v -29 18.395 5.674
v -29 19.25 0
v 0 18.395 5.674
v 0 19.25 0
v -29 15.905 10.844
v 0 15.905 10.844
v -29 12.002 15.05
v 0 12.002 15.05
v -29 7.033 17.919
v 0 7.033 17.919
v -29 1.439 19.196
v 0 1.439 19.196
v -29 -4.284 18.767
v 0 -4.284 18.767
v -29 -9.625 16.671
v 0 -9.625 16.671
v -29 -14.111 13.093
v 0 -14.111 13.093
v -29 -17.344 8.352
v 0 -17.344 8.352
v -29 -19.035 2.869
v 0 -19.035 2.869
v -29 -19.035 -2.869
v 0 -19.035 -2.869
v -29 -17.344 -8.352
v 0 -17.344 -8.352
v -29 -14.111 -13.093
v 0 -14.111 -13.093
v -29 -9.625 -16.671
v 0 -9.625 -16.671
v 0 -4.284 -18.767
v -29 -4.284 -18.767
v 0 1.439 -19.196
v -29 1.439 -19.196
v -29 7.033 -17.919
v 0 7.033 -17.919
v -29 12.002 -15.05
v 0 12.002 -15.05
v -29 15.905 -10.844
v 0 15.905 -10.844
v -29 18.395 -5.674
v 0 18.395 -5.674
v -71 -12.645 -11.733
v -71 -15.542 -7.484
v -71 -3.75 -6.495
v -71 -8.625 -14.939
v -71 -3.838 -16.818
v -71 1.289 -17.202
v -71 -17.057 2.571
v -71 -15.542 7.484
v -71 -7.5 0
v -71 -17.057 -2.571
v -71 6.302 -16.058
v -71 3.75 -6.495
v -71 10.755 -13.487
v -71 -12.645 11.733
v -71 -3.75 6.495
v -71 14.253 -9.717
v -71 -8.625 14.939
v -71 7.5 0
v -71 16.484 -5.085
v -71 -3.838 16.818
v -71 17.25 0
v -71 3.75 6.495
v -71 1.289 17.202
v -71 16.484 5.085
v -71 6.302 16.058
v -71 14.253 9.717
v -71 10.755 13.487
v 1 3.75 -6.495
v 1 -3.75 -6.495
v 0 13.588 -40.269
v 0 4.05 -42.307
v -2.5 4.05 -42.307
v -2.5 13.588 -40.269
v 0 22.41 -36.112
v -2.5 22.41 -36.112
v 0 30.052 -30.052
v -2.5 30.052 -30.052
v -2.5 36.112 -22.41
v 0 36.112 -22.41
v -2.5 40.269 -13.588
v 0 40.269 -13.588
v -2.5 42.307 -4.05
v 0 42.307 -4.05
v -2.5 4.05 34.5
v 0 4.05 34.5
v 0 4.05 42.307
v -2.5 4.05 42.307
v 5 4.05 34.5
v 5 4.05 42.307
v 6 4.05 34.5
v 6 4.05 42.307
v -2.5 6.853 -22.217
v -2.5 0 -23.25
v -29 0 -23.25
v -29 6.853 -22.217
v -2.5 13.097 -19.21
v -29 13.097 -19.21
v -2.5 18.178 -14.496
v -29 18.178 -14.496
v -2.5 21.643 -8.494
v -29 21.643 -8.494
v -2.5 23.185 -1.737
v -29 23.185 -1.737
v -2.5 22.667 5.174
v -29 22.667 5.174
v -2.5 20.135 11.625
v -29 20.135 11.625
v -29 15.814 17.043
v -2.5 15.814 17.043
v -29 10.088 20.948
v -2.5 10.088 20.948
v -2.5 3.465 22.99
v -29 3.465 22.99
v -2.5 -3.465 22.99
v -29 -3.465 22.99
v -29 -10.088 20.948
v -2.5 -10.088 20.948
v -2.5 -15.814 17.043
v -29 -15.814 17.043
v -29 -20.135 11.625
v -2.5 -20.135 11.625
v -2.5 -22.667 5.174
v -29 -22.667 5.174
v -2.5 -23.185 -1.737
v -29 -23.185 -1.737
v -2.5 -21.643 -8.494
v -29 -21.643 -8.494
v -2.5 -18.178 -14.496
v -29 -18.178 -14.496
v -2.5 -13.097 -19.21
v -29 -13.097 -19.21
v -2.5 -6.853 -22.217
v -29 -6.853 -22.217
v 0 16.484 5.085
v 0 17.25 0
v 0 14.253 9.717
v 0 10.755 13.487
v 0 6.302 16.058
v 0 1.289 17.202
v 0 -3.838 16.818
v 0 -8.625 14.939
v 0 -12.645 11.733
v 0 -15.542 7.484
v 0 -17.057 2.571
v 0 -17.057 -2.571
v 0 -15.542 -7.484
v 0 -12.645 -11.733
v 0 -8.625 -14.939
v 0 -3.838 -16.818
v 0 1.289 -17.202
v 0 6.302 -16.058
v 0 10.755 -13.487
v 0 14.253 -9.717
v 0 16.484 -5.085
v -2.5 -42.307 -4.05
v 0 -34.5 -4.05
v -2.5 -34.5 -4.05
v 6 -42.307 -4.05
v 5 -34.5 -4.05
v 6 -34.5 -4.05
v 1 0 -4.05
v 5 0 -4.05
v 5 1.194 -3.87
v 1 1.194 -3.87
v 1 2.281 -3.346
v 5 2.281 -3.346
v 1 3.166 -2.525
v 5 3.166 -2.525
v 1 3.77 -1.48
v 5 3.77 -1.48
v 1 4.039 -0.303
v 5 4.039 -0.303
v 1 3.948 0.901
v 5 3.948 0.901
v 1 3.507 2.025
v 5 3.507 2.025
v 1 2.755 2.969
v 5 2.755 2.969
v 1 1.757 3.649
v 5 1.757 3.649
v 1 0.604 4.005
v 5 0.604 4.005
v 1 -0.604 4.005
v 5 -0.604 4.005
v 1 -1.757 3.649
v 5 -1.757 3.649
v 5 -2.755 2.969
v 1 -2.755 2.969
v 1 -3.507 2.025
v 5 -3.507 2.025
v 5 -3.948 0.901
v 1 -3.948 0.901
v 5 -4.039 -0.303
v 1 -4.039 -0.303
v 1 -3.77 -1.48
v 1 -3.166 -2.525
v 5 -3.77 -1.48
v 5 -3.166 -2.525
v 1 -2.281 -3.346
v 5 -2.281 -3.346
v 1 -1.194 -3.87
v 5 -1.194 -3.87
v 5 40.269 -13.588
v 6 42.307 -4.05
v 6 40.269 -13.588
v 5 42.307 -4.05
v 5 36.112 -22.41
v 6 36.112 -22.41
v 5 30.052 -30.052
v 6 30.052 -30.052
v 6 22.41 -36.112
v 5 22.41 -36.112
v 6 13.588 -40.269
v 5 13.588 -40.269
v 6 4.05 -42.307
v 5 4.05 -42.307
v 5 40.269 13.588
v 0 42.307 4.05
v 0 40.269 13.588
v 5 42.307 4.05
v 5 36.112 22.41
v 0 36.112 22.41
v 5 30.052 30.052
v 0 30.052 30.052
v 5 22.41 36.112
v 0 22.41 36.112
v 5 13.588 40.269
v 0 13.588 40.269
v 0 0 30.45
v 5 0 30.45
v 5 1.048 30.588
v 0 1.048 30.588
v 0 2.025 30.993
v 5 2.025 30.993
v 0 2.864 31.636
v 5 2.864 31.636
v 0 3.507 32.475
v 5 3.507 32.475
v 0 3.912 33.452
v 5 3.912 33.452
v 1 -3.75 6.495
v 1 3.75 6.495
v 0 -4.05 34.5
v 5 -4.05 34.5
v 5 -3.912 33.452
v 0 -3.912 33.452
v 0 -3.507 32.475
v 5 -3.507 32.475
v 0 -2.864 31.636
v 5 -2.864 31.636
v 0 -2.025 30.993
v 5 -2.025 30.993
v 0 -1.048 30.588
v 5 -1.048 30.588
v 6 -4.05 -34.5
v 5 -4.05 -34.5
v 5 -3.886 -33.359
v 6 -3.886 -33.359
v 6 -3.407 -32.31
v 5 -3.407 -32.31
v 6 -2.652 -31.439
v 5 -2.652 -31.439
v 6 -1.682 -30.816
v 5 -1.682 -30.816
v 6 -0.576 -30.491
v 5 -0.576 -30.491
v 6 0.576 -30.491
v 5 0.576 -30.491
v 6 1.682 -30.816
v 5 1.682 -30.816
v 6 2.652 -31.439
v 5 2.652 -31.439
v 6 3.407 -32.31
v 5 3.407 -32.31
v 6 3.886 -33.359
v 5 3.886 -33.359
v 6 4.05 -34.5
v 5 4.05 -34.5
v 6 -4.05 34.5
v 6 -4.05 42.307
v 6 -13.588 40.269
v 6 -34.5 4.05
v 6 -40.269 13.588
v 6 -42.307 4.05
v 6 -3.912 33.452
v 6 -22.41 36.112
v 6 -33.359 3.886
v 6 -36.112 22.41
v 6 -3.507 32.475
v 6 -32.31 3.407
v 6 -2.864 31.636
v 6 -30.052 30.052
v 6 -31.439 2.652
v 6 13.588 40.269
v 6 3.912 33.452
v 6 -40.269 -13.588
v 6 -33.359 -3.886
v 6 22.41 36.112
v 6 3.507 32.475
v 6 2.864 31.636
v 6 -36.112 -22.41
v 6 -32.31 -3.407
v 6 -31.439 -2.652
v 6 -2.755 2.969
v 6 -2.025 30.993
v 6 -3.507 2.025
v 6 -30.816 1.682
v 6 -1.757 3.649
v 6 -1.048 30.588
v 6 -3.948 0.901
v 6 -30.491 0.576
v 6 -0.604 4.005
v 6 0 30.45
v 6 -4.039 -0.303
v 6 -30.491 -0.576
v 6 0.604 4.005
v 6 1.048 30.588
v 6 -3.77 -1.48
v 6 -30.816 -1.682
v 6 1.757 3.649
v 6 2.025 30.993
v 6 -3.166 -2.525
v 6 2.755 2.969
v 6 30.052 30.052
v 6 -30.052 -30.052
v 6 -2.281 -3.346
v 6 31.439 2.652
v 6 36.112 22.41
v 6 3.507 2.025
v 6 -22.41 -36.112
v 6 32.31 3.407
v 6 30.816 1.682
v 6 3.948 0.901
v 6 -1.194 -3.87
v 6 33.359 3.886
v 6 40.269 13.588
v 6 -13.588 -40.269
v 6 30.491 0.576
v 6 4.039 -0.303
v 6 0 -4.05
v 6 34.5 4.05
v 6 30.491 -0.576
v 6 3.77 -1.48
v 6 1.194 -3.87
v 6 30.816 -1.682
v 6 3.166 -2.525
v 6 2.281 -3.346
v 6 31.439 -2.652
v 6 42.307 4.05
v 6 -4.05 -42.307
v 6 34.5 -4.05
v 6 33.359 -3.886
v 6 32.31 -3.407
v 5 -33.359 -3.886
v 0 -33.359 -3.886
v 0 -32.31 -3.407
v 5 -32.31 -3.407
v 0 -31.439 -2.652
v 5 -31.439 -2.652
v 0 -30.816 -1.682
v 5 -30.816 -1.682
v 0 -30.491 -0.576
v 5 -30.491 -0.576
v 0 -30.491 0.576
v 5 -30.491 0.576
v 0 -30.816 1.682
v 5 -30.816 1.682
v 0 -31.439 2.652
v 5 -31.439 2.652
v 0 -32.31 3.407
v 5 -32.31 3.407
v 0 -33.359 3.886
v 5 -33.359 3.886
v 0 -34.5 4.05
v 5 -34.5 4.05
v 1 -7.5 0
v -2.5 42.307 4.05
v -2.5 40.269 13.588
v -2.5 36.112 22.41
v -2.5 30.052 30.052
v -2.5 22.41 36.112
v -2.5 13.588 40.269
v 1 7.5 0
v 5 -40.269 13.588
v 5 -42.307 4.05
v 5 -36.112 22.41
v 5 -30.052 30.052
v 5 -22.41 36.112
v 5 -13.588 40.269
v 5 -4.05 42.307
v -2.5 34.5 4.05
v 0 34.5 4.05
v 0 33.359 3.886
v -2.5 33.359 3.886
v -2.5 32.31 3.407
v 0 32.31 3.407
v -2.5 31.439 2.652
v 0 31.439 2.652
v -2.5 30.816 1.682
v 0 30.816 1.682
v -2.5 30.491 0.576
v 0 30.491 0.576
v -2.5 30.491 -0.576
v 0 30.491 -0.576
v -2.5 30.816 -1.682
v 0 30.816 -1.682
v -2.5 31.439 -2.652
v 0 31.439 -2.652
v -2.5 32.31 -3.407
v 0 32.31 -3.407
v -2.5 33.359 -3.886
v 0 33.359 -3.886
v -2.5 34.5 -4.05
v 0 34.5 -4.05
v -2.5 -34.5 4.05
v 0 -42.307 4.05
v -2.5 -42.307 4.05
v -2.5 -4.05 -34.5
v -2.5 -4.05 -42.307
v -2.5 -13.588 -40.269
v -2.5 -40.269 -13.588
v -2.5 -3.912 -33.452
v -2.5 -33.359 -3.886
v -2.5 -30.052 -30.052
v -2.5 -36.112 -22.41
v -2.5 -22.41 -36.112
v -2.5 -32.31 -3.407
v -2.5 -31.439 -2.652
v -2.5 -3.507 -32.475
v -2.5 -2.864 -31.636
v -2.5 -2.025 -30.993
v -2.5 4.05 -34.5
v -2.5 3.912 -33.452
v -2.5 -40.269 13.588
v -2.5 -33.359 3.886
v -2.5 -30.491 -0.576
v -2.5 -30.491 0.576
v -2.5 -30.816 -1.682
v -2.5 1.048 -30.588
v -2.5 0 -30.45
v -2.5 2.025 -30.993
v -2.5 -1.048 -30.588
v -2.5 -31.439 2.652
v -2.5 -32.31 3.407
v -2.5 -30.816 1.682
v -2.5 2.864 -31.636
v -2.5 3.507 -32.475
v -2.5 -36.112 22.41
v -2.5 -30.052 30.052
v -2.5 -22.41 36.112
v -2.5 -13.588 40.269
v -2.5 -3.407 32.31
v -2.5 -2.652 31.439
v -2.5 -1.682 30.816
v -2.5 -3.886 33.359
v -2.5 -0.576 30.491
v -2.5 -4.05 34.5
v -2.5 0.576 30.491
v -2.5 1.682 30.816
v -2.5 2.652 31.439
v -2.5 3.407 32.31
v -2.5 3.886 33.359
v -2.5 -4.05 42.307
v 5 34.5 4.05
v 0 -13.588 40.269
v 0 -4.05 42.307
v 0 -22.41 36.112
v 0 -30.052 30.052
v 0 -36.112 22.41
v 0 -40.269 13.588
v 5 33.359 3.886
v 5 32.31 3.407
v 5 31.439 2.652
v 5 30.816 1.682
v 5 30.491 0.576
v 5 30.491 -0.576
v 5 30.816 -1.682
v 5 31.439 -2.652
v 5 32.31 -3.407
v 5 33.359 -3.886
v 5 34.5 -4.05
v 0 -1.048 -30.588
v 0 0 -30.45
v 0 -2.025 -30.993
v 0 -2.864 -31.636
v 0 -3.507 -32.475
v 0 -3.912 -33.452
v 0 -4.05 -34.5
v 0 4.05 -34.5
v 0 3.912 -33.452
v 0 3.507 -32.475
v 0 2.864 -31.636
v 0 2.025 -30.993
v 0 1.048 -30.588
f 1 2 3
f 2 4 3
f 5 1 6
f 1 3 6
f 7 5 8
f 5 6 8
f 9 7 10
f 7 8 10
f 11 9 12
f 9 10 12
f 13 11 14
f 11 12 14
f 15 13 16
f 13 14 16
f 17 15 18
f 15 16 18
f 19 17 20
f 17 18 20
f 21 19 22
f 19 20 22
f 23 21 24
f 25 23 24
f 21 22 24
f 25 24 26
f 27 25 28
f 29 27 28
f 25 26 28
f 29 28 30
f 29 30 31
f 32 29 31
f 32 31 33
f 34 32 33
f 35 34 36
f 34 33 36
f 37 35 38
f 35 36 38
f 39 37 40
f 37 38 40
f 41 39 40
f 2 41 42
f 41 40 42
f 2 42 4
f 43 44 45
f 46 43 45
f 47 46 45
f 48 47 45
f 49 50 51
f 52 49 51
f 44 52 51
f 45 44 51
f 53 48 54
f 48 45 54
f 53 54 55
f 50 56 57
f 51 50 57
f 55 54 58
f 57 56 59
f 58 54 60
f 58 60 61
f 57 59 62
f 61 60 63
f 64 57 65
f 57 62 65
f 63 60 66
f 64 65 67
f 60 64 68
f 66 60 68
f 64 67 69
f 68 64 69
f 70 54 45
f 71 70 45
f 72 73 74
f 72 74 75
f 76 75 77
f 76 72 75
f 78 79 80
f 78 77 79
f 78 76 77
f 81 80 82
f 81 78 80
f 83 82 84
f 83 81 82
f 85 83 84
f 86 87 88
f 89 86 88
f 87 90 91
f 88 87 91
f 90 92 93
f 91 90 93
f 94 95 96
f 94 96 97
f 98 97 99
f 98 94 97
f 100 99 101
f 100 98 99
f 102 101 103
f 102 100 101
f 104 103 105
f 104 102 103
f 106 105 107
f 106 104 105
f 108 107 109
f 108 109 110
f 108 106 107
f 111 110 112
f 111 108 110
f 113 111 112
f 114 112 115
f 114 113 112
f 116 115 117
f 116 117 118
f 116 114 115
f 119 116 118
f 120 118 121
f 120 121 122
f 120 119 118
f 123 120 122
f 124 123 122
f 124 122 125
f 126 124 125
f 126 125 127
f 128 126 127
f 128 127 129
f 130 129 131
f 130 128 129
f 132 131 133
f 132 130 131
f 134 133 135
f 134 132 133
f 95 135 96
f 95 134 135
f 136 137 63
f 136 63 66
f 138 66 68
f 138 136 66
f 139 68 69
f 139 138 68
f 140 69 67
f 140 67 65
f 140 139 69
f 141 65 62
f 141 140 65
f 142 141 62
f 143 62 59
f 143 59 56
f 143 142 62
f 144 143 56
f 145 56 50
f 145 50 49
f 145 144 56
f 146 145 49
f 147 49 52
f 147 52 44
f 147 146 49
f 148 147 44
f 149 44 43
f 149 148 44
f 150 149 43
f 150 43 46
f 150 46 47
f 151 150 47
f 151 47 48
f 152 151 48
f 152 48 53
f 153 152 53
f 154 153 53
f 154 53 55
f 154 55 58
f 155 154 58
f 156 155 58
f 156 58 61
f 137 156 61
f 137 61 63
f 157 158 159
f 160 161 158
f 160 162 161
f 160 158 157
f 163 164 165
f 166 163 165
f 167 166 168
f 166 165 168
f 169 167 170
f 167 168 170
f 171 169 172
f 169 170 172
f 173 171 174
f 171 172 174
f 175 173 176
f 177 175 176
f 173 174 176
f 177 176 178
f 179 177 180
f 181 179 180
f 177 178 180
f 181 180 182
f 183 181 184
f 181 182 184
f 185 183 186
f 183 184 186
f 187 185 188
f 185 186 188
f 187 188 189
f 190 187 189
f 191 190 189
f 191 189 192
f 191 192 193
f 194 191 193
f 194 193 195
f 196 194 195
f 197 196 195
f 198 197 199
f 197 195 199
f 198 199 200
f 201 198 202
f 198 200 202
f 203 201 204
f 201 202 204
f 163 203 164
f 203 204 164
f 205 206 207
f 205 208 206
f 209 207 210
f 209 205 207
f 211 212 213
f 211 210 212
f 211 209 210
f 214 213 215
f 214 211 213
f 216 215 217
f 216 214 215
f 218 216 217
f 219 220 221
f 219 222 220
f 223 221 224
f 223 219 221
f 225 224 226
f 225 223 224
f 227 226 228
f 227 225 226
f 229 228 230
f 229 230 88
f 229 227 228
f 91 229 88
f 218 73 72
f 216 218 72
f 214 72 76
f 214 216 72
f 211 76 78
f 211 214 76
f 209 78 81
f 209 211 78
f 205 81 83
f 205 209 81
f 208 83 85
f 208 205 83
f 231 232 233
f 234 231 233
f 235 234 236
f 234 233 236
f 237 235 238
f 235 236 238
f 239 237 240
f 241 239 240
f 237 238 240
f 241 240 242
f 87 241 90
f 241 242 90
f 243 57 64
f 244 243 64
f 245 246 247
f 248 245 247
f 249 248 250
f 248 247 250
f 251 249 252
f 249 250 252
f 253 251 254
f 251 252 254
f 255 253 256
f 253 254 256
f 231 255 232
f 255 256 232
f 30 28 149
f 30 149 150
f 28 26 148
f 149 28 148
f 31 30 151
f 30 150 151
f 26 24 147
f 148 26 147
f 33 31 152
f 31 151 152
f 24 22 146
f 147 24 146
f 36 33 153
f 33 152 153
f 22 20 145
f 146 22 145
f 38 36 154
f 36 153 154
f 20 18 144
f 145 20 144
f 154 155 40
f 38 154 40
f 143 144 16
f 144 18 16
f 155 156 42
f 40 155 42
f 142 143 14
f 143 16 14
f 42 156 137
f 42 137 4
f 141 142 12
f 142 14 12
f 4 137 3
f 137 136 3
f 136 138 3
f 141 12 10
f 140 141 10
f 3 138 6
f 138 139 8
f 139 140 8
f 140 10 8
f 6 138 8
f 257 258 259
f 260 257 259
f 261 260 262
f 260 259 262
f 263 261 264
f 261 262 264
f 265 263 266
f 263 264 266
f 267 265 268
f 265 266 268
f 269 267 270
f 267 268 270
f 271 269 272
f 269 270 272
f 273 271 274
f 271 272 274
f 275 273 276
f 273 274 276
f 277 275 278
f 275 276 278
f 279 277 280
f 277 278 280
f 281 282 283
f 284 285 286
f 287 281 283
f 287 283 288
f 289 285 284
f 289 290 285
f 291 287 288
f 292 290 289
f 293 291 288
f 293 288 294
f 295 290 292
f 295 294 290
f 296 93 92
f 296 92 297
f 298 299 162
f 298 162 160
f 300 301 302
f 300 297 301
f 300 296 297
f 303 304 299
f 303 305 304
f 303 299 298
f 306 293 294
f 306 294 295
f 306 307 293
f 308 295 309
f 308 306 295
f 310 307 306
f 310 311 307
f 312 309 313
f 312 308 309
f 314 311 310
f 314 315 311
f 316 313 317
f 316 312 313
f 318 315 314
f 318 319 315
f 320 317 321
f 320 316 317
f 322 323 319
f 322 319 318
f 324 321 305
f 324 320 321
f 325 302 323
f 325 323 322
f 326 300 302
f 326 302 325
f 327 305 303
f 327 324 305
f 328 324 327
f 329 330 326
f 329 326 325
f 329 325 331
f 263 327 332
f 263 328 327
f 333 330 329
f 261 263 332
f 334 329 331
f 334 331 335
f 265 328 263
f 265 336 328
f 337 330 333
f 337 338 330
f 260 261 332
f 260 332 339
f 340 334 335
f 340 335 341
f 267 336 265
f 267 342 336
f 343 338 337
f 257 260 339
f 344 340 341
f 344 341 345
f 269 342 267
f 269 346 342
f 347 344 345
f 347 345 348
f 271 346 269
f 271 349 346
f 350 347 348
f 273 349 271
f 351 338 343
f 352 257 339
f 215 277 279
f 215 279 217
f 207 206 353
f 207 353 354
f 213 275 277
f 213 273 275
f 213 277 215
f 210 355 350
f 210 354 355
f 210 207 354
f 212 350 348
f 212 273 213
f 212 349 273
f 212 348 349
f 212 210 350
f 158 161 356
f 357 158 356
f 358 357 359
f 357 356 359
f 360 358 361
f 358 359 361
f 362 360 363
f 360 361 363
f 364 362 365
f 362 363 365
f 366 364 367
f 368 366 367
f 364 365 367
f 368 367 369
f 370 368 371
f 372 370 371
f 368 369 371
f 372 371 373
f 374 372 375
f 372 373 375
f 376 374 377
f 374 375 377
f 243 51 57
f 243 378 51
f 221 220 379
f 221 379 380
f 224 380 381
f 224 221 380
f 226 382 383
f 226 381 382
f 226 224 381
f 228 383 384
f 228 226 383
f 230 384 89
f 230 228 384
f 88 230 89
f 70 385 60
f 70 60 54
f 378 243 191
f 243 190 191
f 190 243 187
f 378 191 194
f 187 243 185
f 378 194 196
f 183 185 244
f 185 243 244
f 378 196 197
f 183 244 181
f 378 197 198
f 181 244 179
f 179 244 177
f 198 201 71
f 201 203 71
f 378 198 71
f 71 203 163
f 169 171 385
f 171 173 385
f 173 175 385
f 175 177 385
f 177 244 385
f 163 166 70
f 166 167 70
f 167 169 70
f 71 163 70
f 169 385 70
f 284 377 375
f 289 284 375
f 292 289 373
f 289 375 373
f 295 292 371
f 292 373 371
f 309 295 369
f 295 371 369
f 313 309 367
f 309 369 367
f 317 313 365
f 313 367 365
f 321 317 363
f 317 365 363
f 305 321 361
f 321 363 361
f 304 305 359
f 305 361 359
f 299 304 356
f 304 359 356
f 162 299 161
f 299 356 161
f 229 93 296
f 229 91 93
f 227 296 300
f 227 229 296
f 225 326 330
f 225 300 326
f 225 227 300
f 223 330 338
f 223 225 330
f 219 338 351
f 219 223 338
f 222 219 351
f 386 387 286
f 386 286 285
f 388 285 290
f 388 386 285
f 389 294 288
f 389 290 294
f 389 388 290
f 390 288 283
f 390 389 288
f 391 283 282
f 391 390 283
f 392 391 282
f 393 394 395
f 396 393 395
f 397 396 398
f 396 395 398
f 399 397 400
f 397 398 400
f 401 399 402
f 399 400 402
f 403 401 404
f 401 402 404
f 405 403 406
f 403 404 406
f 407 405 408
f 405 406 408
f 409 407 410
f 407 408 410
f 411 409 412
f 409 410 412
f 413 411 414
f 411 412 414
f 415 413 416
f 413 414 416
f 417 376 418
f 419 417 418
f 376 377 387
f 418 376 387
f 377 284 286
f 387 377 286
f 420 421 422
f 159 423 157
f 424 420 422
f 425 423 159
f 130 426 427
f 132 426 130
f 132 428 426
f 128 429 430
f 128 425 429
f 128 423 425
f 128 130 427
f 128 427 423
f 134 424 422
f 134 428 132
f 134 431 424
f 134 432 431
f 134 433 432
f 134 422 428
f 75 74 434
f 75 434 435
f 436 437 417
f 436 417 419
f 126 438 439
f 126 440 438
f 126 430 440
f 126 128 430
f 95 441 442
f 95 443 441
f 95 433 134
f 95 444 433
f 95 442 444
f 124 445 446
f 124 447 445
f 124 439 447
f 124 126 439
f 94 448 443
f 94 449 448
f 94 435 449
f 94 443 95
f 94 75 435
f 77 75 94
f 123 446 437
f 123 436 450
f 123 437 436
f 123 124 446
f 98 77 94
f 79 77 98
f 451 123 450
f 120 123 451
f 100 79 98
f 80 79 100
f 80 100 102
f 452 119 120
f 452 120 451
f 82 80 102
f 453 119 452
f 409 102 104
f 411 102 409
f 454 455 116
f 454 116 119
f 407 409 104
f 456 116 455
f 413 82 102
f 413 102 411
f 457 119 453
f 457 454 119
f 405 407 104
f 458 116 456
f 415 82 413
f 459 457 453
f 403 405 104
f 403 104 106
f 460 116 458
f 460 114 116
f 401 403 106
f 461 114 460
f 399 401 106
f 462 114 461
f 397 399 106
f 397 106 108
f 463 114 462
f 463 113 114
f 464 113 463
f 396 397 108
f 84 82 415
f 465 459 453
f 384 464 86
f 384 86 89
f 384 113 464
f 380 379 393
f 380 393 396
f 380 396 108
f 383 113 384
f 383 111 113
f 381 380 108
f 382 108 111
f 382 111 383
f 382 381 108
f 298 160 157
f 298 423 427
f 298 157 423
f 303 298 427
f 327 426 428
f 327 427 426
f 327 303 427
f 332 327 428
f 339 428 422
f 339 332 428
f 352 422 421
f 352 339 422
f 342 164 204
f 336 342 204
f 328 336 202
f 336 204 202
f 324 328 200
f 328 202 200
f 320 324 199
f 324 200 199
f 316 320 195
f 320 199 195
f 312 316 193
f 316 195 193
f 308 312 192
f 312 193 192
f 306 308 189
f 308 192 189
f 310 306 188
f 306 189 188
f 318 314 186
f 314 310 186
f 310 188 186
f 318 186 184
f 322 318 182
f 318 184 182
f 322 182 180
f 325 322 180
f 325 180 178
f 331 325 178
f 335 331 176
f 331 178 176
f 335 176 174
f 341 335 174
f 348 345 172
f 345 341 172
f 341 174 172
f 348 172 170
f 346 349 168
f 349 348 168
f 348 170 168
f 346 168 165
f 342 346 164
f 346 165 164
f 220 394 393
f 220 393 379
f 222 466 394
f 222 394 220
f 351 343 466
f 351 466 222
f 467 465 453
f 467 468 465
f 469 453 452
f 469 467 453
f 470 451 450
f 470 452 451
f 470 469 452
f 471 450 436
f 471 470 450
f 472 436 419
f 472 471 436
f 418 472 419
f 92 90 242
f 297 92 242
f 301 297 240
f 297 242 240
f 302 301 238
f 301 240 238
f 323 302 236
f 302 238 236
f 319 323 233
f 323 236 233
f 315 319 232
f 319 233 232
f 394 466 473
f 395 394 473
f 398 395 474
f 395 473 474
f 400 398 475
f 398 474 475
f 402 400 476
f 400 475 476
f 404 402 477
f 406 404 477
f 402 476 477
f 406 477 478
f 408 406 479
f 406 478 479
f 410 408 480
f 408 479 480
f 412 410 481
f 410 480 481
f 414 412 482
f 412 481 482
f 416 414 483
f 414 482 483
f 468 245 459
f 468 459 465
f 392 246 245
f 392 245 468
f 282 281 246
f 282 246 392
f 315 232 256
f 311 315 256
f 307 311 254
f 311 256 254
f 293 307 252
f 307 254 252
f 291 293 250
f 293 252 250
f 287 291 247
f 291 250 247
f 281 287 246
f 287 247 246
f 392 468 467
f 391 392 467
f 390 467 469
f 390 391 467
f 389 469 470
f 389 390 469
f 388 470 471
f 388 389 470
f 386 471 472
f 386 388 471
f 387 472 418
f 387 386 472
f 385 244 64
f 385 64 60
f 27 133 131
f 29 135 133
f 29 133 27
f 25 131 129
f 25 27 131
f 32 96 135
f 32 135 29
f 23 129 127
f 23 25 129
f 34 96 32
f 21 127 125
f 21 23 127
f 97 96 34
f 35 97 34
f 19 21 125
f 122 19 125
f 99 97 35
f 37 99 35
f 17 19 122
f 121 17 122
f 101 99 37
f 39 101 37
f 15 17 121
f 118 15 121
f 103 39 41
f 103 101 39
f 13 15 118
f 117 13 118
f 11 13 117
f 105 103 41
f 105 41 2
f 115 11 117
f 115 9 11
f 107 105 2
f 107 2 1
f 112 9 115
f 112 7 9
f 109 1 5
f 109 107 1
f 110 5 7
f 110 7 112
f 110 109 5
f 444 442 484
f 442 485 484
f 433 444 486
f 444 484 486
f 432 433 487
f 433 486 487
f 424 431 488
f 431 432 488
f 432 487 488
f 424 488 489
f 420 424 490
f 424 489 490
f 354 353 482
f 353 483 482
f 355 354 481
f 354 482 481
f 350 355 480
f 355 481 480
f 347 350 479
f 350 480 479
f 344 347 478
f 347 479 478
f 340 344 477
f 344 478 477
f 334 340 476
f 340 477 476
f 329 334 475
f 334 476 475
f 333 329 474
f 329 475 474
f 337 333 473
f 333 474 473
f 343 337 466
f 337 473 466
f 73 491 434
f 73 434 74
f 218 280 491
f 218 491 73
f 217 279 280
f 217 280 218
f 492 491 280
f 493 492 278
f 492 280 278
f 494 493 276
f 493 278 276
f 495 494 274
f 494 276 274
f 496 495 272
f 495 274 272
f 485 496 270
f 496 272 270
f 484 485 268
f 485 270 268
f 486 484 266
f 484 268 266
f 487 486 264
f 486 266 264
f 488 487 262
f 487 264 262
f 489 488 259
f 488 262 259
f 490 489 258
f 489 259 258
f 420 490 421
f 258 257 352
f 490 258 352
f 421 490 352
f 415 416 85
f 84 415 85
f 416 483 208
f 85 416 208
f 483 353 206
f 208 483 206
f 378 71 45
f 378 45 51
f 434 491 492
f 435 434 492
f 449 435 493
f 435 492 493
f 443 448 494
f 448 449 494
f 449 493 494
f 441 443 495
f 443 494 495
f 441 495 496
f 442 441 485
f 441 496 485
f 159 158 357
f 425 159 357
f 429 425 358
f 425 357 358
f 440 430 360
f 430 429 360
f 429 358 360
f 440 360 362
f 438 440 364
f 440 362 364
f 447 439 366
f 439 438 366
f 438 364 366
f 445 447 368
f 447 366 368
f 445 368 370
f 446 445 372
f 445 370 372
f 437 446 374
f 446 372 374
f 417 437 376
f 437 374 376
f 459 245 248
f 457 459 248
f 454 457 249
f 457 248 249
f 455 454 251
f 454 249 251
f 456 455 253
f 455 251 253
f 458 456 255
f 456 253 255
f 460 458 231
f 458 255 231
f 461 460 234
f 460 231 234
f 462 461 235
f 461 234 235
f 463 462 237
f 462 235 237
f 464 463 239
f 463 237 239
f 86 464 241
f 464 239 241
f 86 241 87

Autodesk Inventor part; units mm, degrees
ref_plane "YZ Plane" through (0, 0, 0) normal (1, 0, 0) x (0, 1, 0)
ref_plane "XZ Plane" through (0, 0, 0) normal (0, 1, 0) x (-1, 0, 0)
sketch "Sketch1" plane through (0, 0, 0) normal (1, 0, 0) x (0, 1, 0)
  circle A0 centre (0, 0) radius 19.25
  circle A1 centre (0, 0) radius 17.25
  circle A2 centre (0, 0) radius 22.25
  dimension "d0" = 38.5
  dimension "d1" = 34.5
  dimension "d6" = 44.5
extrude "Extrusion1" add sketch "Sketch1" along normal blind 5 contours A0 | A1 | A2
extrude "Extrusion2" add sketch "Sketch1" against normal blind 71 contours A1
extrude "Extrusion3" add sketch "Sketch1" against normal blind 34 contours A2
sketch "Sketch2" plane through (5, 0, 0) normal (1, 0, 0) x (0, 0, -1)
  line L0 (0, -7.5) -> (-6.4952, -3.75)
  line L1 (-6.4952, -3.75) -> (-6.4952, 3.75)
  line L2 (-6.4952, 3.75) -> (0, 7.5)
  line L3 (0, 7.5) -> (6.4952, 3.75)
  line L4 (6.4952, 3.75) -> (6.4952, -3.75)
  line L5 (6.4952, -3.75) -> (0, -7.5)
extrude "Extrusion4" cut sketch "Sketch2" against normal through all
sketch "Sketch3" plane through (-34, 0, 0) normal (-1, 0, 0) x (0, 0, 1)
  circle A0 centre (0, 0) radius 42.5
  circle A1 centre (0, 0) radius 22.25 projected
  dimension "d12" = 85
extrude "Extrusion5" add sketch "Sketch3" against normal blind 5
sketch "Sketch4" plane through (5, 0, 0) normal (1, 0, 0) x (0, 0, -1)
  line L0 (0, -7.5) -> (-6.4952, -3.75) projected
  line L1 (-6.4952, -3.75) -> (-6.4952, 3.75) projected
  line L2 (-6.4952, 3.75) -> (0, 7.5) projected
  line L3 (0, 7.5) -> (6.4952, 3.75) projected
  line L4 (6.4952, 3.75) -> (6.4952, -3.75) projected
  line L5 (6.4952, -3.75) -> (0, -7.5) projected
  circle A0 centre (0, 0) radius 4.05
  dimension "d15" = 8.1
extrude "Extrusion6" add sketch "Sketch4" against normal blind 4
ref_plane "Work Plane1" through (-29, 0, 0) normal (1, 0, 0) x (0, 0, -1)
sketch "Sketch5" plane through (-29, 0, 0) normal (1, 0, 0) x (0, 0, -1)
  line L0 (0, 0) -> (34.5, 0)
  circle A0 centre (34.5, 0) radius 4.05
  circle A1 centre (0, 34.5) radius 4.05
  circle A2 centre (-34.5, 0) radius 4.05
  circle A3 centre (0, -34.5) radius 4.05
  dimension "d19" = 34.5
  dimension "d20" = 8.1
  dimension "d23" = 360
extrude "Extrusion7" cut sketch "Sketch5" against normal up to surface (5 mm away)
sketch "Sketch6" plane through (5, 0, 0) normal (1, 0, 0) x (0, 0, -1)
  circle A0 centre (0, 0) radius 22.25 projected
  circle A1 centre (0, 0) radius 23.25
  dimension "d27" = 46.5
extrude "Extrusion8" add sketch "Sketch6" against normal up to surface (34 mm away)
sketch "Sketch7" plane through (5, 0, 0) normal (1, 0, 0) x (0, 0, -1)
  circle A0 centre (0, 0) radius 23.25 projected
  circle A1 centre (0, -34.5) radius 4.05 projected
  circle A2 centre (0, 34.5) radius 4.05 projected
  circle A3 centre (34.5, 0) radius 4.05 projected
  circle A4 centre (-34.5, 0) radius 4.05 projected
  circle A5 centre (0, 0) radius 42.5 projected
extrude "Extrusion9" add sketch "Sketch7" against normal blind 5
sketch "Sketch8" plane through (-34, 0, 0) normal (-1, 0, 0) x (0, 0, 1)
  circle A0 centre (0, -34.5) radius 4.05 projected
  circle A1 centre (0, 34.5) radius 4.05 projected
  circle A2 centre (-34.5, 0) radius 4.05 projected
  circle A3 centre (34.5, 0) radius 4.05 projected
  circle A4 centre (0, 0) radius 42.5 projected
  circle A5 centre (0, 0) radius 19.25 projected
extrude "Extrusion10" cut sketch "Sketch8" against normal up to surface (5 mm away)
sketch "Sketch9" plane through (5, 0, 0) normal (1, 0, 0) x (0, 0, -1)
  circle A0 centre (0, -34.5) radius 4.05 projected
  circle A1 centre (0, 34.5) radius 4.05 projected
  circle A2 centre (34.5, 0) radius 4.05 projected
  circle A3 centre (-34.5, 0) radius 4.05 projected
  circle A4 centre (0, 0) radius 42.5 projected
  circle A5 centre (0, 0) radius 4.05 projected
extrude "Extrusion11" add sketch "Sketch9" along normal blind 1
sketch "Sketch10" plane through (0, 0, 0) normal (-1, 0, 0) x (0, 0, 1)
  circle A0 centre (0, 0) radius 42.5 projected
  circle A1 centre (34.5, 0) radius 4.05 projected
  circle A2 centre (-34.5, 0) radius 4.05 projected
  circle A3 centre (0, 34.5) radius 4.05 projected
  circle A4 centre (0, -34.5) radius 4.05 projected
  circle A5 centre (0, 0) radius 23.25 projected
extrude "Extrusion12" add sketch "Sketch10" along normal blind 2.5
sketch "Sketch11" plane through (6, 0, 0) normal (1, 0, 0) x (0, 0, -1)
  circle A0 centre (0, 34.5) radius 4.05 projected
  line L0 (-4.05, 34.5) -> (-4.05, 42.3066)
  line L1 (4.05, 34.5) -> (4.05, 42.3066)
  circle A1 centre (0, 0) radius 42.5 projected
  arc A2 (4.05, 34.5) -> (-4.05, 34.5) centre (0, 34.5) ccw
  circle A3 centre (0, 0) radius 4.05 projected
  arc A4 (4.05, 42.3066) -> (-4.05, 42.3066) centre (0, 0) ccw
  line L2 (-34.5, -4.05) -> (-42.3066, -4.05)
  line L3 (-34.5, 4.05) -> (-42.3066, 4.05)
  arc A5 (-34.5, 4.05) -> (-34.5, -4.05) centre (-34.5, 0) ccw
  arc A6 (-42.3066, 4.05) -> (-42.3066, -4.05) centre (0, 0) ccw
  line L4 (4.05, -34.5) -> (4.05, -42.3066)
  line L5 (-4.05, -34.5) -> (-4.05, -42.3066)
  arc A7 (-4.05, -34.5) -> (4.05, -34.5) centre (0, -34.5) ccw
  arc A8 (-4.05, -42.3066) -> (4.05, -42.3066) centre (0, 0) ccw
  line L6 (34.5, 4.05) -> (42.3066, 4.05)
  line L7 (34.5, -4.05) -> (42.3066, -4.05)
  arc A9 (34.5, -4.05) -> (34.5, 4.05) centre (34.5, 0) ccw
  arc A10 (42.3066, -4.05) -> (42.3066, 4.05) centre (0, 0) ccw
  dimension "d40" = 360
extrude "Extrusion13" cut sketch "Sketch11" against normal up to surface (8.5 mm away) contours A0 L0 A1 L1 | A1 L7 A9 L6 | L3 A5 L2 A1 | L5 A7 L4 A1
sketch "Sketch12" plane through (1, 0, 0) normal (-1, 0, 0) x (0, 0, 1)
  point P0 (0, 0)
properties part number "wheel_adapter_inner"
